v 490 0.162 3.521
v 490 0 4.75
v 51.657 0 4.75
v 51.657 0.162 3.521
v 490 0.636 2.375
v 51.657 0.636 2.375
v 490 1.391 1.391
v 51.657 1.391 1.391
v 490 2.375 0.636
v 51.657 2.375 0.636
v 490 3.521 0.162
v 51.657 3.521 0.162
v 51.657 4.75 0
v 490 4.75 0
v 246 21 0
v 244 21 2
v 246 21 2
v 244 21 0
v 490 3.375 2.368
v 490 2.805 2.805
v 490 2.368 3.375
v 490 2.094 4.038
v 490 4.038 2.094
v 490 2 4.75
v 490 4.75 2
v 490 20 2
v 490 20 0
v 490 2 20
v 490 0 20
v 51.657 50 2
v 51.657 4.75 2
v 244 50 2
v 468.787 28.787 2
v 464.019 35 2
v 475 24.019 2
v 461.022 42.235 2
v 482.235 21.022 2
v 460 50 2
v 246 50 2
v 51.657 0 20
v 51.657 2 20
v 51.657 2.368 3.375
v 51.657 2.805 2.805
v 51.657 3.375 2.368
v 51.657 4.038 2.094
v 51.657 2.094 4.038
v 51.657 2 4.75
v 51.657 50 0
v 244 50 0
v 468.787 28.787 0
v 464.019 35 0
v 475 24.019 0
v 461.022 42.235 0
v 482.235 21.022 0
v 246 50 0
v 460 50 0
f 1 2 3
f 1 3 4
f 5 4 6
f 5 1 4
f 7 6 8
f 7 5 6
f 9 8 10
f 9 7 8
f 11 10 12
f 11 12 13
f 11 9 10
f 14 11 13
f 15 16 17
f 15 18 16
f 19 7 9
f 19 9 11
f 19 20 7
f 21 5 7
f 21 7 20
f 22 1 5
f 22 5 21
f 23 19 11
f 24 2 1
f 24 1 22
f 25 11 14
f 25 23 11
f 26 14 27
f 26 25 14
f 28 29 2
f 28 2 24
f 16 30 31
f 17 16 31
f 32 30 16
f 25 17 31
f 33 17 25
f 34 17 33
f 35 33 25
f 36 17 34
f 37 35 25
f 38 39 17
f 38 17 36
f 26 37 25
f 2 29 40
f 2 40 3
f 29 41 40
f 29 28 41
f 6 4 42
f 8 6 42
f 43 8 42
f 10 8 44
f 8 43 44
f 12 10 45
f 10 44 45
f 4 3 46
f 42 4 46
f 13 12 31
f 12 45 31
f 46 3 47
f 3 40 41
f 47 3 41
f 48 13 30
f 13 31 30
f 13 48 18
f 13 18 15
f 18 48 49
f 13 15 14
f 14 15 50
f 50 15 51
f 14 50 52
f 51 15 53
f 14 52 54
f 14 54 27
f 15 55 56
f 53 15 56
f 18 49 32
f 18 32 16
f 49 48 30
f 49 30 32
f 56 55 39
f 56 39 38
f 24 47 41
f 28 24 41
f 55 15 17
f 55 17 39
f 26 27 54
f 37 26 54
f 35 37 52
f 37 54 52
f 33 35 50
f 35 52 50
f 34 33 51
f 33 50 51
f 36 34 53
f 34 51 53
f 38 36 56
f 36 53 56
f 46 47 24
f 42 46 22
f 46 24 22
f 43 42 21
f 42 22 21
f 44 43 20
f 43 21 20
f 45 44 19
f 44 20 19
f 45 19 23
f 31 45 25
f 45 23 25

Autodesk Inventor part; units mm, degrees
ref_plane "YZ Plane" through (0, 0, 0) normal (1, 0, 0) x (0, 1, 0)
ref_plane "XZ Plane" through (0, 0, 0) normal (0, 1, 0) x (-1, 0, 0)
ref_plane "XY Plane" through (0, 0, 0) normal (0, 0, 1) x (1, 0, 0)
sketch "Sketch1" plane through (0, 0, 0) normal (0, 0, 1) x (1, 0, 0)
  line L0 (-490, 50) -> (490, 50)
  line L1 (490, 50) -> (490, 0)
  line L2 (490, 0) -> (-490, 0)
  line L3 (-490, 0) -> (-490, 50)
  point P0 (0, 0)
  point P1 (0, 0)
  dimension "d0" = 980
  dimension "d1" = 50
extrude "Plate1" add sketch "Sketch1" along normal blind 2
sketch "Sketch2" plane through (490, 2, 0) normal (0, -1, 0) x (1, 0, 0)
  line L0 (-980, 0) -> (0, 0)
  line L1 (0, 0) -> (0, 20)
  line L2 (0, 20) -> (-980, 20)
  line L3 (-980, 20) -> (-980, 0)
edge flange "Flange1" height 20 angle 90 thickness 2 bend radius 2.75 thickness toward (0, -1, 0) relief tear relief width 2 relief depth 1 edges at (0, 0, 2) wall of the first edge with corners at (-490, 2, 0) (490, 2, 0) (490, 2, 20) (-490, 2, 20)
bend "Bend1"
corner "Corner1"
sketch "Sketch5" plane through (0, 0, 0) normal (0, 0, -1) x (-1, 0, 0)
  line L0 (490, 50) -> (-490, 50) projected
  line L1 (490, 0) -> (-490, 0) projected
  circle A0 centre (0, 50) radius 30
  line L2 (-490, 0) -> (-490, 50)
  line L3 (490, 0) -> (490, 50)
  circle A1 centre (-490, 50) radius 30
  circle A2 centre (490, 50) radius 30
  line L4 (-246, 50) -> (-244, 50)
  line L5 (-244, 50) -> (-244, 21)
  line L6 (-244, 21) -> (-246, 21)
  line L7 (-246, 21) -> (-246, 50)
  line L8 (244, 50) -> (246, 50)
  line L9 (246, 50) -> (246, 21)
  line L10 (246, 21) -> (244, 21)
  line L11 (244, 21) -> (244, 50)
  line L12 (0, 50) -> (0, 0) construction
  point P0 (245, 21)
  point P1 (-245, 21)
  point P2 (-490, 20)
  point P3 (-460, 50)
  point P4 (-30, 50)
  point P5 (30, 50)
  point P6 (460, 50)
  point P7 (490, 20)
  point P8 (-244, 50)
  point P9 (246, 50)
  dimension "d33" = 60
  dimension "d34" = 2
  dimension "d35" = 29
  dimension "d36" = 490
extrude "Extrusion1" cut sketch "Sketch5" against normal through all contours L9 L10 L11 L0 | L0 L3 A2 | A0 L0 | L5 L6 L7 L0 | L2 L0 A1 picked at (470.2507, 47.7748) picked at (6.5355, 34.7298) picked at (-470.2507, 47.7748)
sketch "Sketch7" plane through (0, 0, 2) normal (0, 0, 1) x (1, 0, 0)
  line L0 (468.7934, 20.88) -> (468.7934, 8.88) construction
  line L1 (468.7934, 8.88) -> (280.354, 8.88) construction
  line L2 (280.354, 8.88) -> (280.354, 20.88) construction
  line L3 (280.354, 20.88) -> (468.7934, 20.88) construction
  line L4 (-244, 50) -> (-30, 50) projected
  point P0 (0, 0)
  point P1 (-1, 50)
  point P2 (1, 50)
  dimension "d30" = 12
mark "Mark1"
sketch "Sketch8" plane through (0, 0, 0) normal (0, 0, -1) x (-1, 0, 0)
  line L0 (-244, 50) -> (-51.6572, 50)
  line L1 (-51.6572, 50) -> (502.6857, 50)
  line L2 (502.6857, 50) -> (502.6857, -31.7842)
  line L3 (502.6857, -31.7842) -> (-51.6572, -31.7842)
  line L4 (-51.6572, -31.7842) -> (-51.6572, 50)
  point P0 (0, 0)
extrude "Extrusion3" cut sketch "Sketch8" along normal through all both and the other way through all
equation "\"d1\" = Стрингер_7"
equation "\"d2\" = Thickness"
equation "\"d3\" = BendReliefWidth"
equation "\"d4\" = BendReliefDepth"
equation "\"d5\" = MinimumRemnant"
equation "\"d6\" = TransitionRadius"
equation "\"d9\" = BendRadius"
equation "\"d10\" = CornerReliefSize"
equation "\"d11\" = GapSize"
equation "\"d12\" = JacobiRadiusSize"
equation "\"BendReliefWidth\" = Thickness"
equation "\"BendReliefDepth\" = 0.5 * Thickness"
equation "\"CornerReliefSize\" = 4 * Thickness"
equation "\"MinimumRemnant\" = 2 * Thickness"
equation "\"TransitionRadius\" = BendRadius"
equation "\"JacobiRadiusSize\" = BendRadius"
equation "\"GapSize\" = Thickness"
equation "\"Стрингер_7\" = 50"
equation "\"Thickness\" = 2"
equation "\"BendRadius\" = 2.75"
properties part number "MSC 505 STRINGER BOARD BELLY FACE" material "Stainless Steel"
